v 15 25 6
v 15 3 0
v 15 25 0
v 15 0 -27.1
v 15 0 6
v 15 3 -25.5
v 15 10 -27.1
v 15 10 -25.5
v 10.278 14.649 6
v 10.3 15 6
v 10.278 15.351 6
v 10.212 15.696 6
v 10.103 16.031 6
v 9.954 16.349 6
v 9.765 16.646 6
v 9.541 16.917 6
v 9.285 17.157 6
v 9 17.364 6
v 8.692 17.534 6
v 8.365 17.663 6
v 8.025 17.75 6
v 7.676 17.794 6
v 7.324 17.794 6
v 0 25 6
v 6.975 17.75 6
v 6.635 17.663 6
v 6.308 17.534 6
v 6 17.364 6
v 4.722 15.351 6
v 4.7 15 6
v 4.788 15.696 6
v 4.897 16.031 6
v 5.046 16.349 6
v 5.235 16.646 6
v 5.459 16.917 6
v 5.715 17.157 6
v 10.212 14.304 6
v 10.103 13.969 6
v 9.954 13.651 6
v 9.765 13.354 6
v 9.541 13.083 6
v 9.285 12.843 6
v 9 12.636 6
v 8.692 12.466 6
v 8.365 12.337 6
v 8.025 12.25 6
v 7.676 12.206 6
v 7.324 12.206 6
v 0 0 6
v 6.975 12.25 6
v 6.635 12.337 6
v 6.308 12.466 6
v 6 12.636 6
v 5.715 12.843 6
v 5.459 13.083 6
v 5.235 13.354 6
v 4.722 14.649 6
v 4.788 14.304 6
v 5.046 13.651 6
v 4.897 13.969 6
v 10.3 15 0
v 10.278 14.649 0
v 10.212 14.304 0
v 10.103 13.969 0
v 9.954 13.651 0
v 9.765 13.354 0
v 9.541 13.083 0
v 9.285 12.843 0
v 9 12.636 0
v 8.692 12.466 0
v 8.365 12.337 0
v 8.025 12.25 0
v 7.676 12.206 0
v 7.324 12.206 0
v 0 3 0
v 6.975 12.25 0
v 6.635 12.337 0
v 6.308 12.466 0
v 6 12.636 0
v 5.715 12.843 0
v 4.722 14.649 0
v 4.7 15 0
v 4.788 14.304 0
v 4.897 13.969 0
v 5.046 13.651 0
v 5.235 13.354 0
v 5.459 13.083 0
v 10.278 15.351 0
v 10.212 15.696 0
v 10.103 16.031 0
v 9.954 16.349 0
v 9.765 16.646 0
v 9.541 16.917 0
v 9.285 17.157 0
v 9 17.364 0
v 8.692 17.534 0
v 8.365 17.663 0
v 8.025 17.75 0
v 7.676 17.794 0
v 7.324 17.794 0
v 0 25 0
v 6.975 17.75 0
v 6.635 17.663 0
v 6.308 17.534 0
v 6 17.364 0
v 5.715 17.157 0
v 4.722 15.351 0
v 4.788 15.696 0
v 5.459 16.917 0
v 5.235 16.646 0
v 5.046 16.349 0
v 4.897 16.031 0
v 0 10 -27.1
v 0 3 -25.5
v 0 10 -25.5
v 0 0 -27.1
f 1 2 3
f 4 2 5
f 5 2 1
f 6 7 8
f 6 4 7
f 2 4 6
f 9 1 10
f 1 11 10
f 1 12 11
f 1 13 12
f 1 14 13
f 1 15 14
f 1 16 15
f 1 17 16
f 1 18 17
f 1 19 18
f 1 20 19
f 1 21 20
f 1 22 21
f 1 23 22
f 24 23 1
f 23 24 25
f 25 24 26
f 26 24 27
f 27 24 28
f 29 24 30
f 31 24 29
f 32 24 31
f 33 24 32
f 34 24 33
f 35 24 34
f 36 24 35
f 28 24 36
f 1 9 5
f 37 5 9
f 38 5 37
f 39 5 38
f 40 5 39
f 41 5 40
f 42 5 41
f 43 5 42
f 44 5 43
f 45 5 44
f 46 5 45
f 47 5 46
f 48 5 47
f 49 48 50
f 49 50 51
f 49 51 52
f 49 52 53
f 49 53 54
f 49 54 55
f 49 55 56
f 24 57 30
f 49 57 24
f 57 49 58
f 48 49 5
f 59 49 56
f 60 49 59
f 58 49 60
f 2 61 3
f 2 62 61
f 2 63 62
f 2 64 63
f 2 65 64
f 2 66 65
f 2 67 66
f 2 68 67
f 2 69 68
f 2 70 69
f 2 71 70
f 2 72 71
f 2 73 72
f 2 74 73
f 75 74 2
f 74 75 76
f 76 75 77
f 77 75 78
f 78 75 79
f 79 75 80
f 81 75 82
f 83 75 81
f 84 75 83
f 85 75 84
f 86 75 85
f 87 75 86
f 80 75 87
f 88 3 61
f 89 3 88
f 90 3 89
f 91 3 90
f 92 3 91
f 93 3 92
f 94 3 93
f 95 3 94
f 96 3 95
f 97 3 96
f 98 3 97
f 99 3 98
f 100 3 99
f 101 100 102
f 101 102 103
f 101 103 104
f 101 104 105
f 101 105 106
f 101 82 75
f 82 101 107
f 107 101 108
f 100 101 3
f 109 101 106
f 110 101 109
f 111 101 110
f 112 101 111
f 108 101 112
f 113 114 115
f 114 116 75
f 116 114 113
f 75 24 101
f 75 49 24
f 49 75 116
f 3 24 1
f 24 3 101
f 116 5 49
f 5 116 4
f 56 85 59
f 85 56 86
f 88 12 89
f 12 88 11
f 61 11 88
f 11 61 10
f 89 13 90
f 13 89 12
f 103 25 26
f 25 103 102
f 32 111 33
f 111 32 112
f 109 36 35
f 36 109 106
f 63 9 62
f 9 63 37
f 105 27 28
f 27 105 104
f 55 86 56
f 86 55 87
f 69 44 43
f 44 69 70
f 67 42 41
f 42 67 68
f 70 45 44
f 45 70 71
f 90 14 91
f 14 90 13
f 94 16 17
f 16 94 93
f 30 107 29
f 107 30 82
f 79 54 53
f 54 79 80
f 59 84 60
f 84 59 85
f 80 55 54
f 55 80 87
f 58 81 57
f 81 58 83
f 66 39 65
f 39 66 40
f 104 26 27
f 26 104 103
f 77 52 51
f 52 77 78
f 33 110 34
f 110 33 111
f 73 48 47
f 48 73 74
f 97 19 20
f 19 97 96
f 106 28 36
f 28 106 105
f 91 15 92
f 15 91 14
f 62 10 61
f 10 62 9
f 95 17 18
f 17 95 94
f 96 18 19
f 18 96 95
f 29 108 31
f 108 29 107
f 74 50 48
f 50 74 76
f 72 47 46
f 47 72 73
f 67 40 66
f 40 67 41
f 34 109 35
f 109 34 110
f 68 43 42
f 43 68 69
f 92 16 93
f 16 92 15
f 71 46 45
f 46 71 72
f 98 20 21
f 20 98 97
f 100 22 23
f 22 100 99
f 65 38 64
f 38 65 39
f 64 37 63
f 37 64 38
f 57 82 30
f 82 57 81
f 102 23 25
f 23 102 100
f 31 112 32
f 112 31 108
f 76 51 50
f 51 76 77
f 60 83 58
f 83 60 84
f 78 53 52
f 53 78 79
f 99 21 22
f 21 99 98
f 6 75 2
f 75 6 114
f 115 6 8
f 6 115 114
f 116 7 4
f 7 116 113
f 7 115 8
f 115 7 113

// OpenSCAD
$fn=50;

//Pyciek_Z();
//Pyciek_X();
Pyciek_Y();

module RoundedCube(x_, y_, z_, r_)
{
    hull ()
    { 
        translate ([r_, r_, z_ / 2]) cylinder(h = z_, r = r_, center = true);
        translate ([x_ - r_, r_, z_ / 2]) cylinder(h = z_, r = r_, center = true);
        translate ([x_ - r_, y_ -r_, z_ / 2]) cylinder(h = z_, r = r_, center = true);
        translate ([r_, y_ - r_, z_ / 2]) cylinder(h = z_, r = r_, center = true);
    }
}

module Pyciek_Z()
{
    heightBase = 2.0;
    heightPyciek = 1.6;

    RoundedCube(7, 12, heightBase, 2);
    //translate([0, 5, 0]) cube([7, 2, 7]);
    translate([0, 7]) rotate ([90, 0, 0]) RoundedCube(7, 7, heightBase, 1.5);
}

module Pyciek_X()
{
    heightBase = 8.0;
    widthBase = 25.0;
    depthBase = 2.5;
    depthPyciek = 1.6;
    
    translate([0, (57 / 2) - (25 / 2), 0]) RoundedCube(heightBase, widthBase, depthBase, 2);

    translate([3.2, 0, depthBase]) rotate([90, 0, 90]) RoundedCube(57, 6, depthPyciek, 2);
}

module Pyciek_Y()
{
    depthPyciek = 1.6;

difference(){
cube([15, 25, 6]);
translate ([7.5, 15, 0]) cylinder(h = 6, r = 5.6 / 2, center = false);}

translate ([0, 3, -32.3 + 6]) rotate([90, 0, 0]) cube([15, 32.3, 3]);

translate ([0, 0, -32.3 + 6 - (depthPyciek / 2)]) rotate([0, 0, 0]) cube([15, 10, depthPyciek]);
}
